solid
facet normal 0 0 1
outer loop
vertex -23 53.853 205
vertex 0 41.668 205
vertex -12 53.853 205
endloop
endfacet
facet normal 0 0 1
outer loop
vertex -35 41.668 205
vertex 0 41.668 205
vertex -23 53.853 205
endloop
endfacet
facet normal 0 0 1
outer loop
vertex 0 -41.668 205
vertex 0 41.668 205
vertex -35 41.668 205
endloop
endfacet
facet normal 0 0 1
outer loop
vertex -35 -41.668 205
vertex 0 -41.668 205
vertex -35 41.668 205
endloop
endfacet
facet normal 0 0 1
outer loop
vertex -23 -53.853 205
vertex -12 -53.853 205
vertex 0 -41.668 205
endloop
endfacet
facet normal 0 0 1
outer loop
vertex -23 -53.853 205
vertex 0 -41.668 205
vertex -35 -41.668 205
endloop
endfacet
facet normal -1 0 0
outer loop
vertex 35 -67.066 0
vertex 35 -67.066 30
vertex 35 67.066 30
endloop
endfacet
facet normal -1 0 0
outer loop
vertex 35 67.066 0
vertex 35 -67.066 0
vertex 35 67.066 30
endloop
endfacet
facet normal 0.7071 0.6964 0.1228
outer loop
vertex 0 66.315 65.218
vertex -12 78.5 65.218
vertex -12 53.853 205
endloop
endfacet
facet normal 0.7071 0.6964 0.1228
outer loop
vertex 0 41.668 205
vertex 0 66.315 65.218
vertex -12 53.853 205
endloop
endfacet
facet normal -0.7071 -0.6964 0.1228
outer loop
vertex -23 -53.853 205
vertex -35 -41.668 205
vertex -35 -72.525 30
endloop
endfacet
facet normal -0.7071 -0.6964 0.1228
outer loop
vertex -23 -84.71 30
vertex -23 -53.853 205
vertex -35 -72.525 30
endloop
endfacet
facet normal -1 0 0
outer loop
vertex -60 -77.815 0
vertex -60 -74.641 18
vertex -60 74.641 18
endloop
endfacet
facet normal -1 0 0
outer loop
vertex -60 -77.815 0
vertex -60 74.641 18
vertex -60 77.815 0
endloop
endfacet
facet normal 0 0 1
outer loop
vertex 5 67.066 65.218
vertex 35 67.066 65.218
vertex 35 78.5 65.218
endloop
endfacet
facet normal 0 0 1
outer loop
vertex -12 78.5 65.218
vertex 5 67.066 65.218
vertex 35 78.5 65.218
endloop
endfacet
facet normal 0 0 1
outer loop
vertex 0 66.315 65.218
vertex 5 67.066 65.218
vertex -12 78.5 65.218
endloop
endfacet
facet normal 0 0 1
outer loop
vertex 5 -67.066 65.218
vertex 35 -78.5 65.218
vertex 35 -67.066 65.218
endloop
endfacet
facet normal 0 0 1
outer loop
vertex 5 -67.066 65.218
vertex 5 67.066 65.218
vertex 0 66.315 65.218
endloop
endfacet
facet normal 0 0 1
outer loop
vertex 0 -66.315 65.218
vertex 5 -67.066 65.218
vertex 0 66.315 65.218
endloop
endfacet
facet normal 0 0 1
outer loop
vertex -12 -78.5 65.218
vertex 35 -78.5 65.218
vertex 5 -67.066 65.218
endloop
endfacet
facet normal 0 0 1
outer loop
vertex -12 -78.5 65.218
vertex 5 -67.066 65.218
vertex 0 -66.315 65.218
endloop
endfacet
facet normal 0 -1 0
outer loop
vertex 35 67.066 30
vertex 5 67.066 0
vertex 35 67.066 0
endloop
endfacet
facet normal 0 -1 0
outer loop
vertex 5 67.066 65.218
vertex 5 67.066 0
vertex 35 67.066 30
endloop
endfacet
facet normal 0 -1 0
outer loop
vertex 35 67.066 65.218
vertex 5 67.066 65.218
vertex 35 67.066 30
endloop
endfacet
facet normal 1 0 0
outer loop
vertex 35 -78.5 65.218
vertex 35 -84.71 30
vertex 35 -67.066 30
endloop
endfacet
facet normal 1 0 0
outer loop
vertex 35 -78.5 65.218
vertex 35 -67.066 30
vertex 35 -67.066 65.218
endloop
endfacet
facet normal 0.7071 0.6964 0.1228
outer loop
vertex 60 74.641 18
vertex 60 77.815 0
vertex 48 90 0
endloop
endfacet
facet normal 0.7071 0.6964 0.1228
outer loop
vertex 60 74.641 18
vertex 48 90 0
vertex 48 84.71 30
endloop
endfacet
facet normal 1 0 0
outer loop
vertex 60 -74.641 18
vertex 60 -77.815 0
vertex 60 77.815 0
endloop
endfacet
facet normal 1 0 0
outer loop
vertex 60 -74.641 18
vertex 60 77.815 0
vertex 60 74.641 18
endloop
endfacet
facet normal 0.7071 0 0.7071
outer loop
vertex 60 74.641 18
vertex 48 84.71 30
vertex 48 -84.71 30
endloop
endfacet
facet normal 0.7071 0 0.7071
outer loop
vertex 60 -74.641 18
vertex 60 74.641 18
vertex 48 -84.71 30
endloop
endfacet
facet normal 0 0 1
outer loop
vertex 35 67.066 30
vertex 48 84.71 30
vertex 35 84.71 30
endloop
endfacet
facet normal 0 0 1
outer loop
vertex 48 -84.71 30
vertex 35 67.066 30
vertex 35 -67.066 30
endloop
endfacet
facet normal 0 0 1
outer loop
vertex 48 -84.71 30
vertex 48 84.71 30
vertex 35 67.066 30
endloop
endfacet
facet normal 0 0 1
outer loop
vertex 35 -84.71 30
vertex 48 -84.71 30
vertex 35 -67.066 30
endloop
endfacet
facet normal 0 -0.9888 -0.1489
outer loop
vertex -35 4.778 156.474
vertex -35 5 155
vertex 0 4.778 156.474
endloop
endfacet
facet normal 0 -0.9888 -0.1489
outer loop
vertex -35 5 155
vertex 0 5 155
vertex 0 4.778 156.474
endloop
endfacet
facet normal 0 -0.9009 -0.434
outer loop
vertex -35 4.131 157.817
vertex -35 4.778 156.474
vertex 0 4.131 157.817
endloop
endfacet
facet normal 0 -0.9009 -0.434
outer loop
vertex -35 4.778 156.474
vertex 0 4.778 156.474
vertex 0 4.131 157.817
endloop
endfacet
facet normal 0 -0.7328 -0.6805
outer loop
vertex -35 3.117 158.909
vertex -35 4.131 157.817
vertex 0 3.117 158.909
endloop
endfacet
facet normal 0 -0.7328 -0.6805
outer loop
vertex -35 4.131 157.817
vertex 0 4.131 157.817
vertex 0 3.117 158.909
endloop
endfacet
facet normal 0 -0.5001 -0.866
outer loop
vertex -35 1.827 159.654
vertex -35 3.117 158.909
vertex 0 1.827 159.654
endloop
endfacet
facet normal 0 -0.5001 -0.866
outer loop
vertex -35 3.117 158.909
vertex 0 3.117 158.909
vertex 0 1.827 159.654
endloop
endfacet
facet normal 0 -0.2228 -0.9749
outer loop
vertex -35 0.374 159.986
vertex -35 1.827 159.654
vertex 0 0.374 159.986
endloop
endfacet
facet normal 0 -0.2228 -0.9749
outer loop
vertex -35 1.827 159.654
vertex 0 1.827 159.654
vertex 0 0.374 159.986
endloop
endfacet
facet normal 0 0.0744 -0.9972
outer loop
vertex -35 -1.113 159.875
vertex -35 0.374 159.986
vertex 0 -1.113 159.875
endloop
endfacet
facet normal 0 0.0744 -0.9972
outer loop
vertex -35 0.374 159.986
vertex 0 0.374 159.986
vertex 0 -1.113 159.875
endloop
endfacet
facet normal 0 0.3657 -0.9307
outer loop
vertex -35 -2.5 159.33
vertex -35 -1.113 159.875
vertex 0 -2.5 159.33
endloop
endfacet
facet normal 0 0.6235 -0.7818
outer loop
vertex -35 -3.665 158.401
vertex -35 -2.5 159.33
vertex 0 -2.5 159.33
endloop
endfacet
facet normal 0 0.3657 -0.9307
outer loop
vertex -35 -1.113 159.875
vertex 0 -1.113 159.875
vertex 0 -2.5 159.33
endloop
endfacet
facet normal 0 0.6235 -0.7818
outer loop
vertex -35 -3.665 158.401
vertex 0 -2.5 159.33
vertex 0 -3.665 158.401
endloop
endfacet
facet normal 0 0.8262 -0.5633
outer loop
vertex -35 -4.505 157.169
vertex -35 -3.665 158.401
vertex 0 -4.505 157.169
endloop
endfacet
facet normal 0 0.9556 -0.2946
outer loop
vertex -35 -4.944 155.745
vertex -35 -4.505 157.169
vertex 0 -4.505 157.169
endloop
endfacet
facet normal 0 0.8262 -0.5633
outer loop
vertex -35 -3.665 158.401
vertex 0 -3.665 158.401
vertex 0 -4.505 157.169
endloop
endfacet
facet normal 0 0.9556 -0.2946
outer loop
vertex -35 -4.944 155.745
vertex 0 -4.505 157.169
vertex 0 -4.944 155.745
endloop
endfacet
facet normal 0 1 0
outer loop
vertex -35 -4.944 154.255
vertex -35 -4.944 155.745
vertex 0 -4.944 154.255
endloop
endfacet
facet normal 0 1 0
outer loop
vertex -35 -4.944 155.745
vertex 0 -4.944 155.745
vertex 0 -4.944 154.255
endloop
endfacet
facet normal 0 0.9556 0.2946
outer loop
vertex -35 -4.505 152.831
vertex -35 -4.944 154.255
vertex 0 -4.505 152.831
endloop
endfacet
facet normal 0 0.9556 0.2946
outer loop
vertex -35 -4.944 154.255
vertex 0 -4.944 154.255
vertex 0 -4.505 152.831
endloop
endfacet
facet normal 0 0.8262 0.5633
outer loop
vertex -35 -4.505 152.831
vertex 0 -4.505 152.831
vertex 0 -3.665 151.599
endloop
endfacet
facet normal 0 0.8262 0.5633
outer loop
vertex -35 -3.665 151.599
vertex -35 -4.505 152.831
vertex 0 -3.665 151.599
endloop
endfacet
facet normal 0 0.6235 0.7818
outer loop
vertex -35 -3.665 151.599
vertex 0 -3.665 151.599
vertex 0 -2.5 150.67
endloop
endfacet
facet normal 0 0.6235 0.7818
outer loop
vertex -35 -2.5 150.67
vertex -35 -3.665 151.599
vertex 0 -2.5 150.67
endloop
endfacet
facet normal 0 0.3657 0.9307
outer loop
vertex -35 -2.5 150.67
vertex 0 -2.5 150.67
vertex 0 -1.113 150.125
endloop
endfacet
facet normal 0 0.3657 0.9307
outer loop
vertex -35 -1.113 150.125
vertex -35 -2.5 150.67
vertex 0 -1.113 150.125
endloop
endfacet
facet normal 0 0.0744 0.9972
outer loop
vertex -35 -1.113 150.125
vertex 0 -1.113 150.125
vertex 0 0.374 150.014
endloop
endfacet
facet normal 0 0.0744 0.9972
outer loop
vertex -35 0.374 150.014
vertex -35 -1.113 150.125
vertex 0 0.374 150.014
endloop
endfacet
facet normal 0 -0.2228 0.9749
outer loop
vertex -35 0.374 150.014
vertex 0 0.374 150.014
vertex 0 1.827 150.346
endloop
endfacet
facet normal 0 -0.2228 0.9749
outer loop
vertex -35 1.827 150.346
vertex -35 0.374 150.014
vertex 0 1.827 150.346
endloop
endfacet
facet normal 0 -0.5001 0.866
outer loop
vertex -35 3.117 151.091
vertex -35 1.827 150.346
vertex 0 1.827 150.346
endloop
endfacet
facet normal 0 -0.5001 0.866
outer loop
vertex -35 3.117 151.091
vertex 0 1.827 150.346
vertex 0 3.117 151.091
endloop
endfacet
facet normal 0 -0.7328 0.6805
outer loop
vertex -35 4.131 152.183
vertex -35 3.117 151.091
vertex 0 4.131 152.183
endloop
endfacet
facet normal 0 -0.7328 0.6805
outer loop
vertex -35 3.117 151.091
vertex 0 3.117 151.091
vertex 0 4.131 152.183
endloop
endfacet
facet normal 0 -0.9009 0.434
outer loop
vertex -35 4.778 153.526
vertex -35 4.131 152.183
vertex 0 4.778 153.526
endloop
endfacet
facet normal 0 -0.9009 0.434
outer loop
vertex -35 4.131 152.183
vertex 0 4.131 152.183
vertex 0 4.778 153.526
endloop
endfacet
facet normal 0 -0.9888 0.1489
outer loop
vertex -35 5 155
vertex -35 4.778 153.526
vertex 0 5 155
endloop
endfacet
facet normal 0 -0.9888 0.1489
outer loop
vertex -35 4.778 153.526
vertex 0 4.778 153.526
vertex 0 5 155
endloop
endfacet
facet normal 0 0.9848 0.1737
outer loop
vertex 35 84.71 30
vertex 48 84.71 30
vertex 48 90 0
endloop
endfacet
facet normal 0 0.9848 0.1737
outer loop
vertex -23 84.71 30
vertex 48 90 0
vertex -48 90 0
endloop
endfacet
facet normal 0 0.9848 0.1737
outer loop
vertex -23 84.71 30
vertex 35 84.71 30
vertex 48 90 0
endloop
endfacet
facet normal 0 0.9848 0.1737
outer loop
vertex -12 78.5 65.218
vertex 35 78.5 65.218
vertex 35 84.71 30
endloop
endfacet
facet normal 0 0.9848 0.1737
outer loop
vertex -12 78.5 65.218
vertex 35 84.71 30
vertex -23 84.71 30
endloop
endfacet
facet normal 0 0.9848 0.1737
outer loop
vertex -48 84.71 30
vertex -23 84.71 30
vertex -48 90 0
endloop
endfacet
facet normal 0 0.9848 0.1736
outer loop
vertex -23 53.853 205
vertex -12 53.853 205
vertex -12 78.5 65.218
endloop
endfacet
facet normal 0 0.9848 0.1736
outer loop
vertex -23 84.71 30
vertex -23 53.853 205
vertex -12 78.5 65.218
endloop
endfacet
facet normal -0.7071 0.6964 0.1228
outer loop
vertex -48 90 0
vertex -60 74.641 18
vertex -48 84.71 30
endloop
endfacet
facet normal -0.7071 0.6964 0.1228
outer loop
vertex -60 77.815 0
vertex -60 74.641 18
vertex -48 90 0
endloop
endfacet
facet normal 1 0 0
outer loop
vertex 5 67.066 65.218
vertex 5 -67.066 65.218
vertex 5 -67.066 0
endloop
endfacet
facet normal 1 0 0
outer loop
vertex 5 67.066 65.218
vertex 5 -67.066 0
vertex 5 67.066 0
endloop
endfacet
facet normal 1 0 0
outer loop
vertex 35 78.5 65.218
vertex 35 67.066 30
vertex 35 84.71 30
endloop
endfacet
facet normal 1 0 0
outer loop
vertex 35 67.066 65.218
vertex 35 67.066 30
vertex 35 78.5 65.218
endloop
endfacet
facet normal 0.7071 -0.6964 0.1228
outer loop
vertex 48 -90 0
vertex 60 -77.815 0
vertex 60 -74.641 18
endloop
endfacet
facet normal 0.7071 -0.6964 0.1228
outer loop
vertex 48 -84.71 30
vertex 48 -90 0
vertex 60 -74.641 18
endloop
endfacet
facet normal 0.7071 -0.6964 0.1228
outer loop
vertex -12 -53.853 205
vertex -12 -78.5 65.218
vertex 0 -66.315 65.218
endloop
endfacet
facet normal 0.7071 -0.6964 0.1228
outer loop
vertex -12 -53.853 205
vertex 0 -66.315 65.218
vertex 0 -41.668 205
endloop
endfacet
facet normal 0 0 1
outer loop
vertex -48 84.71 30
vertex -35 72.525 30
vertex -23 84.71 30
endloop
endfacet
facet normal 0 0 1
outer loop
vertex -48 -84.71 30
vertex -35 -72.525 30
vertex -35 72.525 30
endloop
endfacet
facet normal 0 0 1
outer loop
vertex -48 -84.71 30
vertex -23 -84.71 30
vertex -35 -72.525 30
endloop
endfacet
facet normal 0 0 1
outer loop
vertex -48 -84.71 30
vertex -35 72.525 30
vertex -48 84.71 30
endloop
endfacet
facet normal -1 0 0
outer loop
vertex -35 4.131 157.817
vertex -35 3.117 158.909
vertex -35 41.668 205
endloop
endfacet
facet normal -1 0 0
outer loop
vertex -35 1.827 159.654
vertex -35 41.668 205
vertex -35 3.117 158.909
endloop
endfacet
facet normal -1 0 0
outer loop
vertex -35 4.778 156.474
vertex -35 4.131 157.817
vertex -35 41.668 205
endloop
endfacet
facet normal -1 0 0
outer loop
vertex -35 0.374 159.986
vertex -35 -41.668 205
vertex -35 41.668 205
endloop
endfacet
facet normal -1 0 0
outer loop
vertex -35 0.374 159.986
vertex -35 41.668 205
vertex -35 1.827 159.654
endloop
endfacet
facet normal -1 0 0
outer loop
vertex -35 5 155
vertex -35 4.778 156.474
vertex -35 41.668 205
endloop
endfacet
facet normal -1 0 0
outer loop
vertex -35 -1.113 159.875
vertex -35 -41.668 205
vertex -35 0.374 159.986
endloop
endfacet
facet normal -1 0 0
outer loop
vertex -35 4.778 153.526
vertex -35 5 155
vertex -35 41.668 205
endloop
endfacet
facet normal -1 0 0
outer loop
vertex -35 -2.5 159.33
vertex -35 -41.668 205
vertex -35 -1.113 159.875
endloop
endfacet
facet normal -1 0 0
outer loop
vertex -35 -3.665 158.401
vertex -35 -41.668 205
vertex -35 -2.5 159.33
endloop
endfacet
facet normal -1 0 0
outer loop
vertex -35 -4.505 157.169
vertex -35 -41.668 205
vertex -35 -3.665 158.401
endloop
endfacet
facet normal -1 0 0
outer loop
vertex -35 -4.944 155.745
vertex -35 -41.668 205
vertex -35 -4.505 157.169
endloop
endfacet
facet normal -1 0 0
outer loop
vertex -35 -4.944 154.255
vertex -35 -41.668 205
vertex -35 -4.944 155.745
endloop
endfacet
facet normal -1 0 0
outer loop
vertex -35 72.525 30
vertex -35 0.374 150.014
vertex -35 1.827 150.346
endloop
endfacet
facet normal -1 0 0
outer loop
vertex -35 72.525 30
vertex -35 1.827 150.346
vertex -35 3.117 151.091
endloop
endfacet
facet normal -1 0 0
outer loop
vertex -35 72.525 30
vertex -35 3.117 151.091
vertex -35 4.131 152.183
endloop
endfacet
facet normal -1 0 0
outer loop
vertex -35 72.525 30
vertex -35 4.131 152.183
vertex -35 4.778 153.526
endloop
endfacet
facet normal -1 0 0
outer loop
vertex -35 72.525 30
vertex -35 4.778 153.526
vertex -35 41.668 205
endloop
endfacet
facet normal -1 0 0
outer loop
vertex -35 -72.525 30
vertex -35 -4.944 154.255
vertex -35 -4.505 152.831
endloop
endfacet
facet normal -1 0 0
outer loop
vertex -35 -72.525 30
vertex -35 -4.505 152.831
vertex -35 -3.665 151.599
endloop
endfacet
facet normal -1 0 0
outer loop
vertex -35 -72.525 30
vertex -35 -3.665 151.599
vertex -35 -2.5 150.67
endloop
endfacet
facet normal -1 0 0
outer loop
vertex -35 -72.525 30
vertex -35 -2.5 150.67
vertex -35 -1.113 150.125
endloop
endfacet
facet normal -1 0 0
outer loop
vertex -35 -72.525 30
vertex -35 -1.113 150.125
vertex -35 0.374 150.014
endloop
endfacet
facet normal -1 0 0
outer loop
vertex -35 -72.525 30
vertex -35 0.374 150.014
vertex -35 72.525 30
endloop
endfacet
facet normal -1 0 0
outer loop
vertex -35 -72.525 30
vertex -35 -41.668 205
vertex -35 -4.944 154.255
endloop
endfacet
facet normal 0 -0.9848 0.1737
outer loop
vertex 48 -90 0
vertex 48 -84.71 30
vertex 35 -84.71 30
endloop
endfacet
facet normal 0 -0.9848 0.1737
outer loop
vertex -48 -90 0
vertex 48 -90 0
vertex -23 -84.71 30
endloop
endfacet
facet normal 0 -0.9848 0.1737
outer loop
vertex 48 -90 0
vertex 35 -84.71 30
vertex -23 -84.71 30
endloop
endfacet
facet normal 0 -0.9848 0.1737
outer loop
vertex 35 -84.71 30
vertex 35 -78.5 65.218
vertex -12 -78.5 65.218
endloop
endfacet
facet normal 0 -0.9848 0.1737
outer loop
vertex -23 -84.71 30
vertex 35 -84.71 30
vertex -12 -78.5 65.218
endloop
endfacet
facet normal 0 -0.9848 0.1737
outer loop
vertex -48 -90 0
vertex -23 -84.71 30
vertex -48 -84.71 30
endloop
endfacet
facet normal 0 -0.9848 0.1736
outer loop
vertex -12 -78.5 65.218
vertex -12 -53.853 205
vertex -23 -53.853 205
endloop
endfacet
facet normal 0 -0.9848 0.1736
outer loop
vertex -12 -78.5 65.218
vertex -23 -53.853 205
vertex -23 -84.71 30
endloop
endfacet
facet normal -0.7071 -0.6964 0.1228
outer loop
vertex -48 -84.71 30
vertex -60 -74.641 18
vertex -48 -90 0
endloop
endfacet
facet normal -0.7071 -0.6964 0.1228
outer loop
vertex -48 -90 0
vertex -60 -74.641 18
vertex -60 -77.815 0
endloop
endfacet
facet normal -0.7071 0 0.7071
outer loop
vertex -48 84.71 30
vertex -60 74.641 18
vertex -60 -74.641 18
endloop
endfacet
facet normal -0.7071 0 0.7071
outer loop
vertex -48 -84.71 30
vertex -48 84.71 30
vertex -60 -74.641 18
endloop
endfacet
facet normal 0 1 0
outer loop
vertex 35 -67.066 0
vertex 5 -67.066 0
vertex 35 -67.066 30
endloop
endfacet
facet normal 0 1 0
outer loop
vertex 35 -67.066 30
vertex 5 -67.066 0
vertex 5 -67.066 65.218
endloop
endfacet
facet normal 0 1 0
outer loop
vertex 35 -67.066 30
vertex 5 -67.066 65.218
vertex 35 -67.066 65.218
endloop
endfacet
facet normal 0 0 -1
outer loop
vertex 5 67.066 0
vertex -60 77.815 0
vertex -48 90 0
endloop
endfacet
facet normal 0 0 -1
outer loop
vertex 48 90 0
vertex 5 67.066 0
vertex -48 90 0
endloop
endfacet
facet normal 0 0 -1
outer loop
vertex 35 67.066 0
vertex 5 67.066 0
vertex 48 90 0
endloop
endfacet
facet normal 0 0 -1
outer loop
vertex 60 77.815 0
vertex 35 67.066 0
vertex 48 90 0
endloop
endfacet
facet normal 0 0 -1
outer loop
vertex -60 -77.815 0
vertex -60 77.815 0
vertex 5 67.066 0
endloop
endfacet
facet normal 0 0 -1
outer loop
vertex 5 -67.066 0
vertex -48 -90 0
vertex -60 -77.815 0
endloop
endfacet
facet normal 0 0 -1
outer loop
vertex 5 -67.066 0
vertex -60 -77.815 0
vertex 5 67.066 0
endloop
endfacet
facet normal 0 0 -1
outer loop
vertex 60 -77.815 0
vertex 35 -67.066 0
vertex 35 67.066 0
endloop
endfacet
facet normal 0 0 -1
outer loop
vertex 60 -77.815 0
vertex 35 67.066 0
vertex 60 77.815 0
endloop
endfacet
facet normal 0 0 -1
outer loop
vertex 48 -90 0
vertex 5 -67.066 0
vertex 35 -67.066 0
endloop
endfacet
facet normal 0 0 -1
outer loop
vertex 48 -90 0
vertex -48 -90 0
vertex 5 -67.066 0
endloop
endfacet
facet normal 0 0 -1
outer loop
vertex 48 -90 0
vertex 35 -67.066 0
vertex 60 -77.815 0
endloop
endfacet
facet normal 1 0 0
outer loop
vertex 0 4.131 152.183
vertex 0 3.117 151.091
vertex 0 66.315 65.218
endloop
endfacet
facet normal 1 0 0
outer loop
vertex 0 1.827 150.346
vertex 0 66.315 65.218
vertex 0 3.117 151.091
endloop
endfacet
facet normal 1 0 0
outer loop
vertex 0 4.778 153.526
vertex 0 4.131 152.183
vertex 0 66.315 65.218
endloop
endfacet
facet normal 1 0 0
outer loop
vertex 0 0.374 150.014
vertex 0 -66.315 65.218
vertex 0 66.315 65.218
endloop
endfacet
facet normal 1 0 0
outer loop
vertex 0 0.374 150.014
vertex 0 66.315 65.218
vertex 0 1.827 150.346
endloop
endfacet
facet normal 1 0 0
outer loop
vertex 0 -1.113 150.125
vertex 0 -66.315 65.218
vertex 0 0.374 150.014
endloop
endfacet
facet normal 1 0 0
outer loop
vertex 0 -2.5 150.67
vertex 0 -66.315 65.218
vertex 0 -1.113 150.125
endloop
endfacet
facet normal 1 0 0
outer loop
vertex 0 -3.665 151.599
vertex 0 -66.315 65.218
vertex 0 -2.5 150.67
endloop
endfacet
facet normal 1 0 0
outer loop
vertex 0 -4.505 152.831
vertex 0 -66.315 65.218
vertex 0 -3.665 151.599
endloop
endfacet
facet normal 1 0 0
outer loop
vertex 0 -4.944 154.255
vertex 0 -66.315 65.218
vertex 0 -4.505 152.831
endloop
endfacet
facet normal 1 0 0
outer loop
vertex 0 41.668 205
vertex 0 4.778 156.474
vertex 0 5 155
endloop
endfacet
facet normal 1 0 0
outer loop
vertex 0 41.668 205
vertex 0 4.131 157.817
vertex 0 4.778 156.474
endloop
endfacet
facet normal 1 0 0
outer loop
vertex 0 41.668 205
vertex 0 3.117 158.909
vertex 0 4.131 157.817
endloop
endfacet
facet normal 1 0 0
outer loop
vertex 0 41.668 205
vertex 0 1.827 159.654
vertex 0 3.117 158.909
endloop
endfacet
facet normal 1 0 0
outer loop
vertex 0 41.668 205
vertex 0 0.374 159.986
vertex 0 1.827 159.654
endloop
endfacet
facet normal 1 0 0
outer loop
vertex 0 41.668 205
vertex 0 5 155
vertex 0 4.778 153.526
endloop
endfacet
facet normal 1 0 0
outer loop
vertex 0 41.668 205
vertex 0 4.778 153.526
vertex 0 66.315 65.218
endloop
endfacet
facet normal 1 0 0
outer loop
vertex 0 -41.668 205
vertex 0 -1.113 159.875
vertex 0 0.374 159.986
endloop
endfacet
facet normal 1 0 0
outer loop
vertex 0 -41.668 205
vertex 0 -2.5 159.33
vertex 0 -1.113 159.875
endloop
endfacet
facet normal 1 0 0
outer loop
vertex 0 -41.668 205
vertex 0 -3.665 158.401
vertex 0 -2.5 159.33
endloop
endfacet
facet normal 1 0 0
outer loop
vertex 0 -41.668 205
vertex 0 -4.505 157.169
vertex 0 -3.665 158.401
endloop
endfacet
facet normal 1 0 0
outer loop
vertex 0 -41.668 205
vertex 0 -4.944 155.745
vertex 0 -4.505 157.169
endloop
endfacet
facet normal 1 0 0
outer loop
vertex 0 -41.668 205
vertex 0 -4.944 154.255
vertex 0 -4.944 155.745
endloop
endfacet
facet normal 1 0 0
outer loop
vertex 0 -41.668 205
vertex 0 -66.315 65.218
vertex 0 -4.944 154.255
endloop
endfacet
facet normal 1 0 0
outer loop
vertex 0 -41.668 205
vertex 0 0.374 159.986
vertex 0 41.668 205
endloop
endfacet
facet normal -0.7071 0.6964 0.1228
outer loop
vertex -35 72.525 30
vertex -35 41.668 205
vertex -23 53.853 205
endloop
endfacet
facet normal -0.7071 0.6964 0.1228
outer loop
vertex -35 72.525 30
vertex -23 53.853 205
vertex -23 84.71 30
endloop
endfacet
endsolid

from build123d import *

# Parameters (mm, degrees)
F1_DEPTH = 90
F2_R     = 5
F3_DEPTH = 50
F4_W     = 30
F4_H     = 134.1311782598
F5_DEPTH = 40
F7_W     = 309.0550526977
F7_H     = 293.745405972
F8_DEPTH = 60
F9_SIZE  = 12


# Not quite as in the source:
# - a pattern or mirror of a feature is missing from the dataset's text; its kind, count and spacing are read off the source's solid


with BuildPart() as f1:
    # F0 (on Front) → F1 (new body, symmetric)
    with BuildSketch(Plane.XZ):
        Polygon((0, 65.2183964849), (0, 205), (-35, 205), (-35, 30), (-60, 30), (-60, 0), (0, 0), (60, 0), (60, 30), (35, 30), (35, 65.2183964849), align=None)
    extrude(amount=F1_DEPTH, both=True)

    # F2 (on Right) → F3 (cut, symmetric)
    with BuildSketch(Plane.YZ):
        with Locations((0, 155)):
            Circle(F2_R)
    extrude(amount=F3_DEPTH, both=True, mode=Mode.SUBTRACT)

    # F4 (on face) → F5 (cut, symmetric)
    with BuildSketch(Plane.XY.offset(30)):
        with Locations((20, 0)):
            Rectangle(F4_W, F4_H)
    extrude(amount=F5_DEPTH, both=True, mode=Mode.SUBTRACT)

    # F7 (on face) → F8 (cut)
    with BuildSketch(Plane(origin=(0, 87.2861679354, 15.3909064497), x_dir=(-1, 0, 0), z_dir=(0, 0.984807753, 0.1736481777))):
        with Locations((10.5363130569, 83.1948332489)):
            Rectangle(F7_W, F7_H)
    f8 = extrude(amount=F8_DEPTH, mode=Mode.SUBTRACT)

    # F8_copies: F8 across plane
    add(f8.mirror(Plane(origin=(0, 0, 0), x_dir=(0, 0, -1), z_dir=(0, -1, 0))), mode=Mode.SUBTRACT)

    # F9
    f9_edges = [f1.edges().sort_by_distance(p)[0] for p in [
        (0, 66.176603, 135.109198),
        (-35, 69.28158, 117.5),
        (-60, 87.355095, 15),
        (60, 87.355095, 15),
        (-60, 0, 30),
        (60, 0, 30),
        (0, -66.176603, 135.109198),
        (60, -87.355095, 15),
        (-35, -69.28158, 117.5),
        (-60, -87.355095, 15),
    ]]
    chamfer(f9_edges, length=F9_SIZE)


solid = f1.part
